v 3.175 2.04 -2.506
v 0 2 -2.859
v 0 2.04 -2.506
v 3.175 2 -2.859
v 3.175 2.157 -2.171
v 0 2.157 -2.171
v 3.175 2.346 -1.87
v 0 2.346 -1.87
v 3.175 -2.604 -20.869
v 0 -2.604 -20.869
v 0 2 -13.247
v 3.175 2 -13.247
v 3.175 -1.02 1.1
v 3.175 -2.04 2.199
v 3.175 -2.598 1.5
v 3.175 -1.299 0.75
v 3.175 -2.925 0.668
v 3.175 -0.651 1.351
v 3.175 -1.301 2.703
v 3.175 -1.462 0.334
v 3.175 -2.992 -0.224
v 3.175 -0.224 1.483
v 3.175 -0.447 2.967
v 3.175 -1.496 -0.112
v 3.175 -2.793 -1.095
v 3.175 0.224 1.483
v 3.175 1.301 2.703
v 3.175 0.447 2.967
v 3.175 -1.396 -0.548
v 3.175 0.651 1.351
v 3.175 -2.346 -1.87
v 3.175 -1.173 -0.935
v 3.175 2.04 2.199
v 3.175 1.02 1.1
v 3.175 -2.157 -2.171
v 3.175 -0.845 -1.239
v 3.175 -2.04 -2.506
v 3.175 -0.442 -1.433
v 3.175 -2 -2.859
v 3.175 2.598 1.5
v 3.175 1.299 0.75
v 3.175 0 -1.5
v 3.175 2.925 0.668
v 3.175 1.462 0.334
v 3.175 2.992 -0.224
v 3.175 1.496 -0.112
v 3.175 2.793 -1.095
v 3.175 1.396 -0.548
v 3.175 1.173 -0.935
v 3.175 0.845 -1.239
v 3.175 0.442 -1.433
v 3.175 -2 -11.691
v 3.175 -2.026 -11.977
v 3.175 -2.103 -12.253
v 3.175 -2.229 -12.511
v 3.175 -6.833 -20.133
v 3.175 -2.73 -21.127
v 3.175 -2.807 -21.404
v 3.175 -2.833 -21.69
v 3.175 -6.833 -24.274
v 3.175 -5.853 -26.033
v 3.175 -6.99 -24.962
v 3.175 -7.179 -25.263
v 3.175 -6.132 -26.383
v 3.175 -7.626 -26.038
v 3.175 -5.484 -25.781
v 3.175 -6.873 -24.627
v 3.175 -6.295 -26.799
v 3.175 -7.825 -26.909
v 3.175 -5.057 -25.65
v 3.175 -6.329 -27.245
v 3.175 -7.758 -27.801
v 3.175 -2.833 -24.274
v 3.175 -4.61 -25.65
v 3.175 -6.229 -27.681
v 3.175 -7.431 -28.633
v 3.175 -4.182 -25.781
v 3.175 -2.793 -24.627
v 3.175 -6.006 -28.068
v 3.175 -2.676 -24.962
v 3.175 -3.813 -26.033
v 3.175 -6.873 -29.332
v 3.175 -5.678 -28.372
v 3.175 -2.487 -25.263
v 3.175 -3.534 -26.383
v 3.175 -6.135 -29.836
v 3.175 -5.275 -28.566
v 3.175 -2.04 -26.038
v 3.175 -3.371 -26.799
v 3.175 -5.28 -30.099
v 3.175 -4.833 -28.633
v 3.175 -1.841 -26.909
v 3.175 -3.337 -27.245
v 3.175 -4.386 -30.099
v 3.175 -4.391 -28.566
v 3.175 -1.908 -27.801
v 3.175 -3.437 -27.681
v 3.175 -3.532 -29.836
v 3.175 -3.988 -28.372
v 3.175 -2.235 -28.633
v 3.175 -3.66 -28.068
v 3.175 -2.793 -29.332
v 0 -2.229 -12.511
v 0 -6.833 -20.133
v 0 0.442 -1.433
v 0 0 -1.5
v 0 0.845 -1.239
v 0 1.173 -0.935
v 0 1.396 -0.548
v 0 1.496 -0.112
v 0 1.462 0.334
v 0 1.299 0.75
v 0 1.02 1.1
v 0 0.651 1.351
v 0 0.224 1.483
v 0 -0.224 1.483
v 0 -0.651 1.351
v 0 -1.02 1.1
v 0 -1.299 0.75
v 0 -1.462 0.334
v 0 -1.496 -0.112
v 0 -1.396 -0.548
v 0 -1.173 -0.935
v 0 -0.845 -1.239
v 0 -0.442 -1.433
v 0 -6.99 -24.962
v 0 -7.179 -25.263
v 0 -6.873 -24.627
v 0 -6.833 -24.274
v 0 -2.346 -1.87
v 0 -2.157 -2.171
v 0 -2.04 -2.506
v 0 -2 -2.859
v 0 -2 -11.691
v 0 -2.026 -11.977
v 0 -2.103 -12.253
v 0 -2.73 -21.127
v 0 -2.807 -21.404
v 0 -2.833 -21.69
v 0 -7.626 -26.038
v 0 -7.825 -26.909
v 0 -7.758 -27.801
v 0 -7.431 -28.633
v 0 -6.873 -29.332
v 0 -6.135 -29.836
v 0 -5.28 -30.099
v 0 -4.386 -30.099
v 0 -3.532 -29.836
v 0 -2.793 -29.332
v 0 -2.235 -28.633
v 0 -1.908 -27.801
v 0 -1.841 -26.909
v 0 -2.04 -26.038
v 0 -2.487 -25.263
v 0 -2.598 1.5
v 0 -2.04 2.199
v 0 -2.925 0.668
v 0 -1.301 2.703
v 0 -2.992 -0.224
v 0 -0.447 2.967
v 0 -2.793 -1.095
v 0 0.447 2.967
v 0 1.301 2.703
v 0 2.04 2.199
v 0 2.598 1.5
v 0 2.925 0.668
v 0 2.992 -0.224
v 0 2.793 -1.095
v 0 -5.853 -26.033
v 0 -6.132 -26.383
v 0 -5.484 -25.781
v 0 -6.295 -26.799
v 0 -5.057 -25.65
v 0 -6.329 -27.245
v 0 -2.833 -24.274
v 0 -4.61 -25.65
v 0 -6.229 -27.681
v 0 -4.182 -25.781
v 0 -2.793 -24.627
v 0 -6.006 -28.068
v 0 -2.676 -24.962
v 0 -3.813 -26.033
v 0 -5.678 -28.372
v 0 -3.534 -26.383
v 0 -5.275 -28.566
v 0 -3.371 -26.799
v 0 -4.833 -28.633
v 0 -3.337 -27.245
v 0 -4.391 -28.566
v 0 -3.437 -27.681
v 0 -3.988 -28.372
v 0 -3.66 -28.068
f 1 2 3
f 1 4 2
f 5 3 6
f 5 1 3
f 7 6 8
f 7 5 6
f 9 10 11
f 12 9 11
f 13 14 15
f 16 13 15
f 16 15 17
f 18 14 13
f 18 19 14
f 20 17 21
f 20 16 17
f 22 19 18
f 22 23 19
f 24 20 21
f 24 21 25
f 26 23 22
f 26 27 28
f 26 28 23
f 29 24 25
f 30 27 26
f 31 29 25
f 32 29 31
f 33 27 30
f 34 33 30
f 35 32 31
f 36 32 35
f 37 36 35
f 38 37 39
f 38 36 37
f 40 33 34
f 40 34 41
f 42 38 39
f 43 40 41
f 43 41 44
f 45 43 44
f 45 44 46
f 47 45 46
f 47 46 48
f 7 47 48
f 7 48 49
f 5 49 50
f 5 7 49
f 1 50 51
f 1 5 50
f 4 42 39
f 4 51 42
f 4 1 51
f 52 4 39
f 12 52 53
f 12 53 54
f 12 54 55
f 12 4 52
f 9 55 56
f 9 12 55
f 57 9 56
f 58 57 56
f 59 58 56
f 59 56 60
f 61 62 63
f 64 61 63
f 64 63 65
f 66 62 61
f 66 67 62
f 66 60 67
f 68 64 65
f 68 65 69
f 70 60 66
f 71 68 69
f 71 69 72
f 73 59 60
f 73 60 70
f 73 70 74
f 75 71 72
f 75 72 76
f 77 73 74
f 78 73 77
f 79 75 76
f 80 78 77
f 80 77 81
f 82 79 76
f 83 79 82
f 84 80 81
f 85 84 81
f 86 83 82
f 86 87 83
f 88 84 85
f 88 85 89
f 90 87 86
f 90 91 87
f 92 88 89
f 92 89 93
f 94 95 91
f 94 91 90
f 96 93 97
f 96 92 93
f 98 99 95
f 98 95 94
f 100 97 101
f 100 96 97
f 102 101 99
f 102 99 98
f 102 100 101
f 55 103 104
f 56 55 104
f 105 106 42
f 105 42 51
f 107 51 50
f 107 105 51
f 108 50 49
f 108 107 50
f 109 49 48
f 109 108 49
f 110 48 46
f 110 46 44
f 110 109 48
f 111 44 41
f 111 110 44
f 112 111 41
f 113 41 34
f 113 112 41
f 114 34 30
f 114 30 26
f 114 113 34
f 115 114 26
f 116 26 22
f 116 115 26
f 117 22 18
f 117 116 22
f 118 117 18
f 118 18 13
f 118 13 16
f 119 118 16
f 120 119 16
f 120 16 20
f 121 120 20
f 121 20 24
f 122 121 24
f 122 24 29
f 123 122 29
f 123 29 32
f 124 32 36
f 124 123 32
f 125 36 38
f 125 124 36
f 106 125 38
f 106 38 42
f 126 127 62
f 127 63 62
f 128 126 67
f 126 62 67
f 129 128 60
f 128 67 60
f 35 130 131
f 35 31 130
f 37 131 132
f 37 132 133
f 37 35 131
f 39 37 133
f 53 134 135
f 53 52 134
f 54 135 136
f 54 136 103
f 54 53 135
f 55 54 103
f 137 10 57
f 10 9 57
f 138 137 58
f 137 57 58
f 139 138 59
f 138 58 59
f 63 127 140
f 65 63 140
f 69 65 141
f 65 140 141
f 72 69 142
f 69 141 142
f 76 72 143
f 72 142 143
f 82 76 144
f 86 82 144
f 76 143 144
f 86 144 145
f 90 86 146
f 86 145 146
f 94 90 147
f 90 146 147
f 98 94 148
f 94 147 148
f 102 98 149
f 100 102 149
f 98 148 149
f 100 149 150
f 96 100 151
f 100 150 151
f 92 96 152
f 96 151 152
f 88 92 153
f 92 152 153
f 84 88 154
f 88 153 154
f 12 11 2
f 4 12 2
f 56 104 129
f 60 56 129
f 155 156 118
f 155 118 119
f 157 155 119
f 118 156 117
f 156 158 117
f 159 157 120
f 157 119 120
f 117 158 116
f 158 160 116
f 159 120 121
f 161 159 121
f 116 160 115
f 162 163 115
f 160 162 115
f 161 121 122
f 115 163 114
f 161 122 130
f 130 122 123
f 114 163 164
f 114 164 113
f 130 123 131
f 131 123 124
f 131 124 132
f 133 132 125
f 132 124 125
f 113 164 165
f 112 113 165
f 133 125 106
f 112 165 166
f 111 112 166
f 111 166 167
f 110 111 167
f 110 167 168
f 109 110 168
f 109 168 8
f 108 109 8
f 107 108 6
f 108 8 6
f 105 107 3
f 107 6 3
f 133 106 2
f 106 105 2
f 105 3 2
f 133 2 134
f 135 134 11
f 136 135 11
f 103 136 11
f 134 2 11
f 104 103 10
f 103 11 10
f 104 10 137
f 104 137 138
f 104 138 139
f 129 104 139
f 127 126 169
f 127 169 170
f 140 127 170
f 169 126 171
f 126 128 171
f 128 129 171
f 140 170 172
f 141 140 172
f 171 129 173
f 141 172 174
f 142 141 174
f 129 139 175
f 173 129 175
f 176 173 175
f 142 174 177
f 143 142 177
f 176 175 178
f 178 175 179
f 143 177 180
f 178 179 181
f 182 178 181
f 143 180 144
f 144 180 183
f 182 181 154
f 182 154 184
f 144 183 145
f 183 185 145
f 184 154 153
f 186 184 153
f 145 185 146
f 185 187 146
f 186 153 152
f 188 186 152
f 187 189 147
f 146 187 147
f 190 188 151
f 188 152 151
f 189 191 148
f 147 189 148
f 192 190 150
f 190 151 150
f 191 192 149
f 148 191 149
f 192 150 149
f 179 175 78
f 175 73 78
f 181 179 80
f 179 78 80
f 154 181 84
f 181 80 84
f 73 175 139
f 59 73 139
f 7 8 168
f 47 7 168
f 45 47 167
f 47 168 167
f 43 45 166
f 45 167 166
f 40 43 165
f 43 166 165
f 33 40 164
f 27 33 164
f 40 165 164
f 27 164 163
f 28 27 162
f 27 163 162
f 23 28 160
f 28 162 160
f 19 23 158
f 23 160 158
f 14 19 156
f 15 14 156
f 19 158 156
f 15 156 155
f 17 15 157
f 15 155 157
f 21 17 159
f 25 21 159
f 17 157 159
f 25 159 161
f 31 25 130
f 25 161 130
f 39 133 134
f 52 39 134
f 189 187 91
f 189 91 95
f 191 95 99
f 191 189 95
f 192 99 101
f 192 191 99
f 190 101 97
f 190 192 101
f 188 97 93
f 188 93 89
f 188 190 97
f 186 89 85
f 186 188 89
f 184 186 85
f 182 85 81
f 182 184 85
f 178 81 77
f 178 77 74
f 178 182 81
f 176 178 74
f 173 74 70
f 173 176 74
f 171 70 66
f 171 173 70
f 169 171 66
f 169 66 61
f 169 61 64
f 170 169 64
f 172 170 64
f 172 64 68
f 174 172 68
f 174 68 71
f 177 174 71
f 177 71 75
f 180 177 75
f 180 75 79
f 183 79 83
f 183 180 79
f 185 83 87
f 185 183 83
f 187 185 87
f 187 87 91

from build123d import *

# Parameters (mm, degrees)
SKETCH2_R           = 1.5
BOSS_EXTRUDE1_DEPTH = 3.175
FILLET1_R           = 1.5875


with BuildPart() as part:
    # Sketch2 → Boss-Extrude1 (new body)
    with BuildSketch(Plane(origin=(0, 0, 0), x_dir=(0, 0, -1), z_dir=(1, 0, 0))):
        with BuildLine():
            Line((13.247387042, 2), (2.236067977, 2))
            ThreePointArc((2.236067977, 2), (-3, 0), (2.236067977, -2))
            Line((2.236067977, -2), (12.13290764, -2))
            Line((12.13290764, -2), (20.13290764, -6.833106971))
            Line((20.13290764, -6.833106971), (24.896839663, -6.833106971))
            ThreePointArc((24.896839663, -6.833106971), (30.13290764, -4.833106971), (24.896839663, -2.833106971))
            Line((24.896839663, -2.833106971), (21.247387042, -2.833106971))
            Line((21.247387042, -2.833106971), (13.247387042, 2))
        make_face()
        Circle(SKETCH2_R, mode=Mode.SUBTRACT)
        with Locations((27.13290764, -4.833106971)):
            Circle(SKETCH2_R, mode=Mode.SUBTRACT)
    extrude(amount=BOSS_EXTRUDE1_DEPTH)

    # Fillet1
    fillet1_edges = [part.edges().sort_by_distance(p)[0] for p in [
        (1.5875, -6.833106971, -24.896839663),
        (1.5875, -2, -12.13290764),
        (1.5875, -2, -2.236067977),
        (1.5875, 2, -2.236067977),
        (1.5875, -2.833106971, -21.247387042),
        (1.5875, -2.833106971, -24.896839663),
    ]]
    fillet(fillet1_edges, radius=FILLET1_R)


solid = part.part
